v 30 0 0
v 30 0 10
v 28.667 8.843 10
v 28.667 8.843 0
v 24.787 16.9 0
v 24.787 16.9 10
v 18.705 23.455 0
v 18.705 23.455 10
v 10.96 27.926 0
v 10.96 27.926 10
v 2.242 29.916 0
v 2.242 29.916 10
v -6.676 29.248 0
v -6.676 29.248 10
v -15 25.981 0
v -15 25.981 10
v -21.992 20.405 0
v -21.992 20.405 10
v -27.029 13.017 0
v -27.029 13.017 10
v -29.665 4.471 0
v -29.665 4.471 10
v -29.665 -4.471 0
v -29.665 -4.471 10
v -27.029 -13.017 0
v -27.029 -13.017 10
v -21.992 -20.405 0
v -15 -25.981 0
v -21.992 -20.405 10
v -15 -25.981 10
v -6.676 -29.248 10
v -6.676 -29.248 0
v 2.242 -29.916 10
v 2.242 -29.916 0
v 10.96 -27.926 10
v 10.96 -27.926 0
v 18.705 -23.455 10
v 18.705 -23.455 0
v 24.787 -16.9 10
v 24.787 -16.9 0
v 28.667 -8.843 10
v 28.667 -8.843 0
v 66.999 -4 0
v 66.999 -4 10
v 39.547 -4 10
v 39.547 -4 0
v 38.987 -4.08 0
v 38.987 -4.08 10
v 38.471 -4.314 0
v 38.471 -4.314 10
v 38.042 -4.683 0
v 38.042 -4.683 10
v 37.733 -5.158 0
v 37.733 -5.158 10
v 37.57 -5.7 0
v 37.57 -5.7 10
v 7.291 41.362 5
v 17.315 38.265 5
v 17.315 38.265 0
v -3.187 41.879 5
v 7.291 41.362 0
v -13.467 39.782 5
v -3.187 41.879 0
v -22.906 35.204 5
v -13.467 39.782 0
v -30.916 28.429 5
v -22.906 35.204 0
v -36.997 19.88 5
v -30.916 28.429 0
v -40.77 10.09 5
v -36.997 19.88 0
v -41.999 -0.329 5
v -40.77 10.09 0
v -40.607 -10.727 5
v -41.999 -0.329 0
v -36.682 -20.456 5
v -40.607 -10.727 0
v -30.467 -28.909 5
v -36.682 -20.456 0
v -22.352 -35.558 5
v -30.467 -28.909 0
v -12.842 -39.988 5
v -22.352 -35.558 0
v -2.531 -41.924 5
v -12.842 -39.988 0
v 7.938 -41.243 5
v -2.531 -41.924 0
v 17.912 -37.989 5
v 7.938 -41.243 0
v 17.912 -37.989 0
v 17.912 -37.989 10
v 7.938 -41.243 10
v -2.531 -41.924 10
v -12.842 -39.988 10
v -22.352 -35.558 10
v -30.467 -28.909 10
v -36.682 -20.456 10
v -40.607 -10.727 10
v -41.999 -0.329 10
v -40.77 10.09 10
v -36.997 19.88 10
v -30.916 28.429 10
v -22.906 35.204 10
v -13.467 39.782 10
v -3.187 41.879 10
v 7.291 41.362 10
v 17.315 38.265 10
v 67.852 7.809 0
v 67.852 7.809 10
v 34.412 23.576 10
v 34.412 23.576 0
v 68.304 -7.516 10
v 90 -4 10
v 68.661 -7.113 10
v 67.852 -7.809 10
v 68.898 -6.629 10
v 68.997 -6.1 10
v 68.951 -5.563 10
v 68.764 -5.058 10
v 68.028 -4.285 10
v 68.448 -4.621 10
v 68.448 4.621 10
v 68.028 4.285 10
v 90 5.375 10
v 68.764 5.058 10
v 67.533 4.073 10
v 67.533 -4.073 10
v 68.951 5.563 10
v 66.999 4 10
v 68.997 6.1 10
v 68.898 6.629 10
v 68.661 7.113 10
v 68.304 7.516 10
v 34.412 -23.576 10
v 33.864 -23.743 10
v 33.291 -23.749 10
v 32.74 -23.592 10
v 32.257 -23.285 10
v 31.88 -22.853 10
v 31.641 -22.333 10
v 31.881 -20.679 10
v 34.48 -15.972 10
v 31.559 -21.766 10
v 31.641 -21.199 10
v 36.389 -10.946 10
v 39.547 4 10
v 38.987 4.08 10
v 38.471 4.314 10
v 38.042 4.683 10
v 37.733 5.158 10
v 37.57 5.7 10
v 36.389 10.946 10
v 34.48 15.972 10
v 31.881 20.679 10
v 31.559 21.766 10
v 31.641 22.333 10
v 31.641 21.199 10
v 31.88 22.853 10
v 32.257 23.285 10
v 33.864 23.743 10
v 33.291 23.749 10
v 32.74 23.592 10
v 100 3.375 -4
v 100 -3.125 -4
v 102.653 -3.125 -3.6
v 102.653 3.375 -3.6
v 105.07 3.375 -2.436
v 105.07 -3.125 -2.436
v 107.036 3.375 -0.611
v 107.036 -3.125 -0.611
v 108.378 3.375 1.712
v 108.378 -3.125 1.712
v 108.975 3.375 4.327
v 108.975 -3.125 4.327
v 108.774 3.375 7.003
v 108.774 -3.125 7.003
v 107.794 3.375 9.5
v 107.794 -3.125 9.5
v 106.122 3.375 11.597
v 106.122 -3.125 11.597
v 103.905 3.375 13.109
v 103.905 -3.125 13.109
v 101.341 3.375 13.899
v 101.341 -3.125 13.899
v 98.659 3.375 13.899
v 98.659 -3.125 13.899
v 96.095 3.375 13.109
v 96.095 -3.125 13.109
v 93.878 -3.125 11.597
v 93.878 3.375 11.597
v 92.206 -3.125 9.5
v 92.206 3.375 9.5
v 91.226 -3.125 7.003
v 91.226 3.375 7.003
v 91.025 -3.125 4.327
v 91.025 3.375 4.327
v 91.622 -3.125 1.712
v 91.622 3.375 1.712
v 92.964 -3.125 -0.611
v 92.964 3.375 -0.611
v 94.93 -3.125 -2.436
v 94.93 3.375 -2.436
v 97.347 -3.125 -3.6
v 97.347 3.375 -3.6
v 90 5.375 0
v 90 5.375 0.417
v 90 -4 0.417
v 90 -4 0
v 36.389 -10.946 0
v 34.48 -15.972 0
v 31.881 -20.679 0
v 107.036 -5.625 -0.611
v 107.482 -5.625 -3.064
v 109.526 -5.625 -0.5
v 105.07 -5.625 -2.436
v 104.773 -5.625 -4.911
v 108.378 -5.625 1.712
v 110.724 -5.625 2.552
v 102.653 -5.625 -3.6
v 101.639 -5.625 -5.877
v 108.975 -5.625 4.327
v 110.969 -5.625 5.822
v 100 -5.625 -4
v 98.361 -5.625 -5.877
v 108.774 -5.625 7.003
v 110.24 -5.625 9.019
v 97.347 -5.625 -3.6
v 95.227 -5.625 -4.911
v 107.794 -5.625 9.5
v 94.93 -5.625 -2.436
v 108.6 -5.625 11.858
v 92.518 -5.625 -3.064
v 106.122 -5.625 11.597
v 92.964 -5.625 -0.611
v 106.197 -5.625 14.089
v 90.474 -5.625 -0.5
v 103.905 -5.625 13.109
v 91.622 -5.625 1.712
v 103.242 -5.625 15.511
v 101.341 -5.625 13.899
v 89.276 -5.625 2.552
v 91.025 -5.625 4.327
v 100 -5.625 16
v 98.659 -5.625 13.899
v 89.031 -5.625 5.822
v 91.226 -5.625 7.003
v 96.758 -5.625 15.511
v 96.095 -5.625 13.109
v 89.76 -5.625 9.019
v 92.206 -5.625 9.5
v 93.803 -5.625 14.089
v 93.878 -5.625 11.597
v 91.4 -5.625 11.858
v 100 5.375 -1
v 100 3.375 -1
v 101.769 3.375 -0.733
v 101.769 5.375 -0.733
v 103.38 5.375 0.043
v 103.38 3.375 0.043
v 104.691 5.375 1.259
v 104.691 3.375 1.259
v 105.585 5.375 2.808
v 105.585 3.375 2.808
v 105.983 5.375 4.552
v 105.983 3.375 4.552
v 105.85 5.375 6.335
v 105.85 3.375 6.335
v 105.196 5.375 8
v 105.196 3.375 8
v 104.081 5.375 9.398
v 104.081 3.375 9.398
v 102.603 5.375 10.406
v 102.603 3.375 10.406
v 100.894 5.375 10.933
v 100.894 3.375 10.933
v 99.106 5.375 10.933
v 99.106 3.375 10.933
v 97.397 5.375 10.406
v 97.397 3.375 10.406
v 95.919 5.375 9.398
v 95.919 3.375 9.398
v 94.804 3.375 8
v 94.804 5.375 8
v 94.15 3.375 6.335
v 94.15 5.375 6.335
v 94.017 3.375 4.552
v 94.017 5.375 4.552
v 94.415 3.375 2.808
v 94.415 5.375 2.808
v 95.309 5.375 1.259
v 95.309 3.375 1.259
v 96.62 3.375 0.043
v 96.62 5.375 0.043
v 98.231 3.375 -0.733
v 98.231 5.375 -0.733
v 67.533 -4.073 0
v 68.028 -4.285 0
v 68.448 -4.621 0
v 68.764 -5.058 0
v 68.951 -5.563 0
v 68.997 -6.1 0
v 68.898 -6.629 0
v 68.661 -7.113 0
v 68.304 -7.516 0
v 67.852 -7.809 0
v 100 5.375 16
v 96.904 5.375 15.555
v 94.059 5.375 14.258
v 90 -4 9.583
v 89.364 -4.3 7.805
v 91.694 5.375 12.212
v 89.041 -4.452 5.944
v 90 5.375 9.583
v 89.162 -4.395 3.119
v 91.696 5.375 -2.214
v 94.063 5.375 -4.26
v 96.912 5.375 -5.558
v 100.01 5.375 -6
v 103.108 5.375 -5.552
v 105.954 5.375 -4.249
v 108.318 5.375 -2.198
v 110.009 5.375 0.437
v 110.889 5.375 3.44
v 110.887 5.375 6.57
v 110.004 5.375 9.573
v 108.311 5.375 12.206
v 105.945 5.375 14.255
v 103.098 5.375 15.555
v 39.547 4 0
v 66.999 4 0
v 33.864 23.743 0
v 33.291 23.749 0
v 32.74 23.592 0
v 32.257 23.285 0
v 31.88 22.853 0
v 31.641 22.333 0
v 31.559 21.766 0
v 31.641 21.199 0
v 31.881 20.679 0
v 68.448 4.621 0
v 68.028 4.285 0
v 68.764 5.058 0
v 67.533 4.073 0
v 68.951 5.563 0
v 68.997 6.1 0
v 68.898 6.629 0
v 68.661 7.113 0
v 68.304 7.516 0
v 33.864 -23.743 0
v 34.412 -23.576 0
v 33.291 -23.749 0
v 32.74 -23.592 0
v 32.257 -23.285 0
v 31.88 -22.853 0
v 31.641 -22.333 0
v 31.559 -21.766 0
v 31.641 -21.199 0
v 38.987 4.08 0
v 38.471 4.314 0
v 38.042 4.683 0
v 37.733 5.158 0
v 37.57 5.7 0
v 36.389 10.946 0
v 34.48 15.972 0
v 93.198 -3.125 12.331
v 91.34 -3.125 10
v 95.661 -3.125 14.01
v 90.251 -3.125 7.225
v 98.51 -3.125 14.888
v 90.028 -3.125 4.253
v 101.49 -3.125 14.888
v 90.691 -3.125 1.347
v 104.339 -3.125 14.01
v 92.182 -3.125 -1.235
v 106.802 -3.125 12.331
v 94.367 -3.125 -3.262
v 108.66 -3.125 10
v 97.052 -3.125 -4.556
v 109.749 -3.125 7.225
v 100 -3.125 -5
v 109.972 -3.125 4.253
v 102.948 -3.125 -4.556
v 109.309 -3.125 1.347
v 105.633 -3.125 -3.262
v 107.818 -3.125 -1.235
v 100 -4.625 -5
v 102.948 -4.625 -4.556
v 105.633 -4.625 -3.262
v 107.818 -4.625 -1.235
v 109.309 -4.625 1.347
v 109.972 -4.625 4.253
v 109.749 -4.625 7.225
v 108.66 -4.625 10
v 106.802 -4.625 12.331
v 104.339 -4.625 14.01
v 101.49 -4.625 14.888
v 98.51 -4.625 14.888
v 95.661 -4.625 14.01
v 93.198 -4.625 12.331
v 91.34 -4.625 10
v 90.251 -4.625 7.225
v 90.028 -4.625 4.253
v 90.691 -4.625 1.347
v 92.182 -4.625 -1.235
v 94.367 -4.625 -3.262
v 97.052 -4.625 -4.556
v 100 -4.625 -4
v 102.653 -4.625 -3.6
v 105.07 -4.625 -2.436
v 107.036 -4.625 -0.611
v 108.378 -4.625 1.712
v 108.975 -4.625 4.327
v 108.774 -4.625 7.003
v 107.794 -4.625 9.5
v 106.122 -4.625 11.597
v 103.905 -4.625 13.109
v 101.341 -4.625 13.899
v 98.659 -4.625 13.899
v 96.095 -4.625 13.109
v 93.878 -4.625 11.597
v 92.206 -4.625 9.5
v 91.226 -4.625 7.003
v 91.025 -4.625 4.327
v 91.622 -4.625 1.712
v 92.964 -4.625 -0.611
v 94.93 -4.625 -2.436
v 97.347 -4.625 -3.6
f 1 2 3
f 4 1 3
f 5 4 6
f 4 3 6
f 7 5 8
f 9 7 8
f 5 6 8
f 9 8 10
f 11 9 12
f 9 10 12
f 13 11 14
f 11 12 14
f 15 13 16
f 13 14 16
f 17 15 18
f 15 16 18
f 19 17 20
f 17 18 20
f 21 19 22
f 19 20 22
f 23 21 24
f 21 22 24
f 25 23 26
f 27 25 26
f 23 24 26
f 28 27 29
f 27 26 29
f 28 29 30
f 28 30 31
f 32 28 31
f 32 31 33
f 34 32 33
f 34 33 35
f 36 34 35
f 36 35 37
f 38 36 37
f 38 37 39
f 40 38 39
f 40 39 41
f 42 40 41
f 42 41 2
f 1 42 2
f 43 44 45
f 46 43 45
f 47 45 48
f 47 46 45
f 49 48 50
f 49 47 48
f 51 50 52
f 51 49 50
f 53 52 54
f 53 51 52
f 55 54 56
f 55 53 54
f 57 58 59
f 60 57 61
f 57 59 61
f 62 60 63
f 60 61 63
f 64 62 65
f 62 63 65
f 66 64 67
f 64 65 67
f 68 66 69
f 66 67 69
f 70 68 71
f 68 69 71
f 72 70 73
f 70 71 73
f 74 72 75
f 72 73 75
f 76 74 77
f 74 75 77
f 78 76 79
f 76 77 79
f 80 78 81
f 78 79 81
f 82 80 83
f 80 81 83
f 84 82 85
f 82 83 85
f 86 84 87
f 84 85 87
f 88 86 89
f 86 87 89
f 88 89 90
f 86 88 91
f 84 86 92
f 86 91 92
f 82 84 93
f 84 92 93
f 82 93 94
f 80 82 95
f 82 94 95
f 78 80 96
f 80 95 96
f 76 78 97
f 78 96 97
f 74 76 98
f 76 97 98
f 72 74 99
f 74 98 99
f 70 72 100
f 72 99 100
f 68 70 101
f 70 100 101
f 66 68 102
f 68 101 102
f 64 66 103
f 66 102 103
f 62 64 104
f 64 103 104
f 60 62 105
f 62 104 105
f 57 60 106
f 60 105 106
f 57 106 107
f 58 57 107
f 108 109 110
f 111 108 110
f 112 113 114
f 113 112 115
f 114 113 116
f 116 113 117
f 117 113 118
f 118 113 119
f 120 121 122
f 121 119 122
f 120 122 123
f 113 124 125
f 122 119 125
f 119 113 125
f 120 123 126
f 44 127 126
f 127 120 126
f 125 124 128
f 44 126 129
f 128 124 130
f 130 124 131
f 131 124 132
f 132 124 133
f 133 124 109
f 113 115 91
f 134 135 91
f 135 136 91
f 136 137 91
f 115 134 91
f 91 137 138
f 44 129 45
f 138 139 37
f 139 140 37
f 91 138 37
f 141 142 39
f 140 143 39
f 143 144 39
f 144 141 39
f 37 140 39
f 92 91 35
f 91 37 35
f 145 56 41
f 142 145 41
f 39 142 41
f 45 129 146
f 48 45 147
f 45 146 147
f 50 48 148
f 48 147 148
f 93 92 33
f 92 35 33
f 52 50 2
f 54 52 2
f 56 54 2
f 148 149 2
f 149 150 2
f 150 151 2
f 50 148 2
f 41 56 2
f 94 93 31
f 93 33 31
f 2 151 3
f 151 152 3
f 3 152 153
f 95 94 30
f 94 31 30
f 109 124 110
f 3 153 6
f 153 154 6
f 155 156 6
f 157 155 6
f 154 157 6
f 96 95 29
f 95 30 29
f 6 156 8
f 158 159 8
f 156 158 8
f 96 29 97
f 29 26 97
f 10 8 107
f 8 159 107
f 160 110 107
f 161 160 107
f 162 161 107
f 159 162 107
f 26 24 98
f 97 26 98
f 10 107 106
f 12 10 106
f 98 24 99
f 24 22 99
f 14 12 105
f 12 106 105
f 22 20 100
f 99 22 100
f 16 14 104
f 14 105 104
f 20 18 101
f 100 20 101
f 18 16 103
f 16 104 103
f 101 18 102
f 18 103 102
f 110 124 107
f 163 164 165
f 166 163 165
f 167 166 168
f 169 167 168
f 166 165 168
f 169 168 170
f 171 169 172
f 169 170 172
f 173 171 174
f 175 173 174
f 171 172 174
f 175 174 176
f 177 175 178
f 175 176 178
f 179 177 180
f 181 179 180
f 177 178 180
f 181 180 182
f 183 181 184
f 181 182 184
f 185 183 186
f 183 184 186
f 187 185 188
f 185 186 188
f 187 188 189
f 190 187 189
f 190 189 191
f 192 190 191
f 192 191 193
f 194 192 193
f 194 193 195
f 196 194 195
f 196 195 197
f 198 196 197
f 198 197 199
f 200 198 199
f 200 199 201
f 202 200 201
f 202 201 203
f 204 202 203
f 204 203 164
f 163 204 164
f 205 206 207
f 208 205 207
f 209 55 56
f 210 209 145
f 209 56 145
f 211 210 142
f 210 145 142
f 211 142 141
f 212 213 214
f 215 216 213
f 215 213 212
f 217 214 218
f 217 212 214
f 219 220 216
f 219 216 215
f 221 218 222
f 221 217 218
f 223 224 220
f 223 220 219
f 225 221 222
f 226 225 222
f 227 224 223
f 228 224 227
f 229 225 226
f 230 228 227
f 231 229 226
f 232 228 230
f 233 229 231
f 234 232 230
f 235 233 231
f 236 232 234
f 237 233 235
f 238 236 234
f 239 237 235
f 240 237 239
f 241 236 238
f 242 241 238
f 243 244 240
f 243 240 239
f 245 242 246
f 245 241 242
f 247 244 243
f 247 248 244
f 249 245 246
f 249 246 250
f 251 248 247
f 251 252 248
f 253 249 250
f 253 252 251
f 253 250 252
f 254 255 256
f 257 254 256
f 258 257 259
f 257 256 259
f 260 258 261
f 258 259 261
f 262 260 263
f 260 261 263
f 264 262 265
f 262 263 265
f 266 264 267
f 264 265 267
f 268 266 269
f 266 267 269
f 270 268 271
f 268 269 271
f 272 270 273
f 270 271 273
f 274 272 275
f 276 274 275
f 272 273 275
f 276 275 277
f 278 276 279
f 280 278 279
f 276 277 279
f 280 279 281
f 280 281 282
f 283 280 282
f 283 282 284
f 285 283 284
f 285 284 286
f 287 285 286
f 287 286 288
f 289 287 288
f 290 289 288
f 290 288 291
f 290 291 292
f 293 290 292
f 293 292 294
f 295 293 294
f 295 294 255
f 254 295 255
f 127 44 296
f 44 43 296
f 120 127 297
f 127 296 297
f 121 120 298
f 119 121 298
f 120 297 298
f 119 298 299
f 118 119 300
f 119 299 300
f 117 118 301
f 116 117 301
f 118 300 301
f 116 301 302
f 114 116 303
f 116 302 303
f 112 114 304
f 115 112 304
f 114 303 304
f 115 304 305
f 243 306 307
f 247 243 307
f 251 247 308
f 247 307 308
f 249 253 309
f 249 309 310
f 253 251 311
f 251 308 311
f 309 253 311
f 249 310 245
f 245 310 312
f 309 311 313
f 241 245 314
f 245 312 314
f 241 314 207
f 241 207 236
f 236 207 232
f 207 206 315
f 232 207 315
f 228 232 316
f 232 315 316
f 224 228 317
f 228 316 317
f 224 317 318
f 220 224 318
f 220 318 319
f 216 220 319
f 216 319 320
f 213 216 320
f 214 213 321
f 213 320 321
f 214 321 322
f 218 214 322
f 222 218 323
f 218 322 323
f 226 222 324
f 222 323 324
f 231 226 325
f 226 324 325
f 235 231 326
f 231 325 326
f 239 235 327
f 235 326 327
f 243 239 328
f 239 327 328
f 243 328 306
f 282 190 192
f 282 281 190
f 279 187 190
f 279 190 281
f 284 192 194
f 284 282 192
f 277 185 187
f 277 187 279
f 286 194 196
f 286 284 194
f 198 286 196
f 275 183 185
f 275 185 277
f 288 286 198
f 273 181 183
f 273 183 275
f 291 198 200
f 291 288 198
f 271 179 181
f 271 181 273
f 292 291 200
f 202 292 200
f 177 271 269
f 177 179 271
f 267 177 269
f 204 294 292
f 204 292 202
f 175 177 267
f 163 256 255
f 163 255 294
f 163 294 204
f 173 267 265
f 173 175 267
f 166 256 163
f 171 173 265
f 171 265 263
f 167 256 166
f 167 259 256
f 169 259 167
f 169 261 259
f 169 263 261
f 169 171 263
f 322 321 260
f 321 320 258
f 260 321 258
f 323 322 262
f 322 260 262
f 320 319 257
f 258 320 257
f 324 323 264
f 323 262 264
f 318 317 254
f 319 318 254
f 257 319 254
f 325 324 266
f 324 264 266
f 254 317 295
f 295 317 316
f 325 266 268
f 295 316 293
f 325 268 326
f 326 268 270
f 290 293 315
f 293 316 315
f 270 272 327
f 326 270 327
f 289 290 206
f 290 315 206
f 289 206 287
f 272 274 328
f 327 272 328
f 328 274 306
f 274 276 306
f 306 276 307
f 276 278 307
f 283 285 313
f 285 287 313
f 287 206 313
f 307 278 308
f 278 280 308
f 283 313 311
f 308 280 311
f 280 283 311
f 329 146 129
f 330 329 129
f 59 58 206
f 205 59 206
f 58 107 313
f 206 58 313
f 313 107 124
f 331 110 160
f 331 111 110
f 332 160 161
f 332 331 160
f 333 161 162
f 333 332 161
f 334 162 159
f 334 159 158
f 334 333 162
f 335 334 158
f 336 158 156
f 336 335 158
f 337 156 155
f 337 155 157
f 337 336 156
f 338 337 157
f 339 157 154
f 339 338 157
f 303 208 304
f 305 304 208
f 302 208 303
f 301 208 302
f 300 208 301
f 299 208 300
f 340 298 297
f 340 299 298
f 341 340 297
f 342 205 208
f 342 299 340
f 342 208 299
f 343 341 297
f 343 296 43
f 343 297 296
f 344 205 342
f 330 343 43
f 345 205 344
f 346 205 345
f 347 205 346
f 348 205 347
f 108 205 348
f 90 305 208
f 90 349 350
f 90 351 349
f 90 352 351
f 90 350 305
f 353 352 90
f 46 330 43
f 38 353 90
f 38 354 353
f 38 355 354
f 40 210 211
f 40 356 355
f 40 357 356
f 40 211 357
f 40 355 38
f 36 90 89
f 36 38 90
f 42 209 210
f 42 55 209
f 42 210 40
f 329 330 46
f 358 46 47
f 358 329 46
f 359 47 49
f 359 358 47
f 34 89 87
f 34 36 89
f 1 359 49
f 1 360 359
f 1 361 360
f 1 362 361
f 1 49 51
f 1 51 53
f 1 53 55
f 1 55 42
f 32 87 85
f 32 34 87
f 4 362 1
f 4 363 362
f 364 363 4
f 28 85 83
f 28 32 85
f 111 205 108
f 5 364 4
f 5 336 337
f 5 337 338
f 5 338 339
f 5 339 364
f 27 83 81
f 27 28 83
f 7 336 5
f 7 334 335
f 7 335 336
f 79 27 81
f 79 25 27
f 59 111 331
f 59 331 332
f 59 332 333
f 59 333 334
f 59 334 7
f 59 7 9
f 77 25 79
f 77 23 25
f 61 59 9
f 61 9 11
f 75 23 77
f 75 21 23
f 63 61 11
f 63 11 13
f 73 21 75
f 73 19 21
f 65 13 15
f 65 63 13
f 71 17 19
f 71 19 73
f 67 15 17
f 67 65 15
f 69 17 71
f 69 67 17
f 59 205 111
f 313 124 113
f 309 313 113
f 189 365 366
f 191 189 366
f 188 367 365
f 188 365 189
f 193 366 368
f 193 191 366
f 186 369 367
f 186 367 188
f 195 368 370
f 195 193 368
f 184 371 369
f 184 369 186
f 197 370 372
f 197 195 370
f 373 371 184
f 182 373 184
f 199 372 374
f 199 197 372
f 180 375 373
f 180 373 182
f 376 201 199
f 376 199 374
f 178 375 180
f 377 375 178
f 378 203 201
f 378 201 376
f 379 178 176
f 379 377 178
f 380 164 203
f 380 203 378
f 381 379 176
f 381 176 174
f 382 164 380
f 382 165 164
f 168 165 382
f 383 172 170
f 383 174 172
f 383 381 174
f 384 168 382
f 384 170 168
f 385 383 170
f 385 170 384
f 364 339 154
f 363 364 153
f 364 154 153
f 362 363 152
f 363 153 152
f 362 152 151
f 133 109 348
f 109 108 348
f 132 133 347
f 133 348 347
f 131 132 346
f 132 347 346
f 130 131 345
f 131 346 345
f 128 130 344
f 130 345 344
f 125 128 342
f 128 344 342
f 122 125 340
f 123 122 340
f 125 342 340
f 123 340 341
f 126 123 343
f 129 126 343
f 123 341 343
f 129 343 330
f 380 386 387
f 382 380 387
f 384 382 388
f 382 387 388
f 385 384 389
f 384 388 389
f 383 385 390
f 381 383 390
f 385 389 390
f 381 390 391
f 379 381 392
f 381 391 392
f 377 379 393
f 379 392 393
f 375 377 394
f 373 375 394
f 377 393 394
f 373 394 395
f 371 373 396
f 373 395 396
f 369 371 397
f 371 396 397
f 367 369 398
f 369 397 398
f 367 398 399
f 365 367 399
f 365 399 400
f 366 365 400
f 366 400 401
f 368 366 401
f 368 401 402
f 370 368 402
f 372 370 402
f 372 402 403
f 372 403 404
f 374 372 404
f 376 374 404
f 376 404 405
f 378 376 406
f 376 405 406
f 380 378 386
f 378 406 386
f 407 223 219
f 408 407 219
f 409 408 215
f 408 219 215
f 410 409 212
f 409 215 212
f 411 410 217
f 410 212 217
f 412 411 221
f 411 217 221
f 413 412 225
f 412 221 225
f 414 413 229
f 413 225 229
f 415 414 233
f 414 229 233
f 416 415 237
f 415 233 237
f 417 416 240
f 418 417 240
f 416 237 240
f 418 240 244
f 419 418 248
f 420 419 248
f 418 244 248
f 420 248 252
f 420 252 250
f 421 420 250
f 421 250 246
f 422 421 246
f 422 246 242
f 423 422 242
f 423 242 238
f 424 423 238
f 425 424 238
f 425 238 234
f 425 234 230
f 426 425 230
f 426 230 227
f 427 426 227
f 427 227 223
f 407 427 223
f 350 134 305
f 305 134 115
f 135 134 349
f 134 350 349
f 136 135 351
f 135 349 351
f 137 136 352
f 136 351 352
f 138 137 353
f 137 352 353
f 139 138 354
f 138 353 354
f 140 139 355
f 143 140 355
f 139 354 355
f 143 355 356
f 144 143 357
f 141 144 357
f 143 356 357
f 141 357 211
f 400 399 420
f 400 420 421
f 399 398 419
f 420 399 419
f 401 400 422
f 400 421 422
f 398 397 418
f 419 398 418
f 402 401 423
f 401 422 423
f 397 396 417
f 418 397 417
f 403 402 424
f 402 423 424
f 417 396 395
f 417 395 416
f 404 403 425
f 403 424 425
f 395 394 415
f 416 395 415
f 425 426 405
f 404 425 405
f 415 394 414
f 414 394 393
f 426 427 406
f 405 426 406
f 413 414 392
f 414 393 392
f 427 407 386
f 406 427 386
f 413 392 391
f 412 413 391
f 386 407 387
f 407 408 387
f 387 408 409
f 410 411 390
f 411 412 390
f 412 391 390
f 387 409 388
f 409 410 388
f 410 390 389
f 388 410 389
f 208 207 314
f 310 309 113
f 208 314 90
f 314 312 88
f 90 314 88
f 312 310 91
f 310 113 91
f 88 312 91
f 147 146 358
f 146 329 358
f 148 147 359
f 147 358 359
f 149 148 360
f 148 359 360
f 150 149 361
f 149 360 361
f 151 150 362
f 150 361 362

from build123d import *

# Parameters (mm, degrees)
SKETCH_1_R          = 42
EXTRUDE_1_DEPTH     = 5
SKETCH_2_W          = 11
SKETCH_2_H          = 11
EXTRUDE_2_DEPTH     = 5
SKETCH_4_R          = 6
CUT_EXTRUDE_1_DEPTH = 25
SKETCH_5_R          = 9
CUT_EXTRUDE_2_DEPTH = 9
CUT_EXTRUDE_START   = 8
SKETCH_6_R          = 10
SKETCH_6_R_2        = 9
CUT_EXTRUDE_3_DEPTH = 1.5
SKETCH_7_R          = 30
CUT_EXTRUDE_4_DEPTH = 30
FILLET_1_R          = 2


with BuildPart() as part:
    # 草图1 → 凸台-拉伸1 (new body)
    with BuildSketch(Plane.XY):
        Circle(SKETCH_1_R)
    extrude(amount=EXTRUDE_1_DEPTH)



with BuildPart() as body_2:
    # 草图2 → 旋转1 (revolve)
    with BuildSketch(Plane.XY.offset(5), mode=Mode.PRIVATE) as revolve_1_sk:
        with Locations((94.5, -0.125)):
            Rectangle(SKETCH_2_W, SKETCH_2_H)
    revolve(revolve_1_sk.sketch.rotate(Axis((100, 22.717290725, 5), (0, -1, 0)), 270), axis=Axis((100, 22.717290725, 5), (0, -1, 0)))


with BuildPart() as part_1:
    add(part.part)

    add(body_2.part)  # 凸台-拉伸2 merges body 2
    # 草图3 → 凸台-拉伸2 (add, symmetric)
    with BuildSketch(Plane.XY.offset(5)):
        with BuildLine():
            Line((17.314737244, 38.264864748), (90, 5.375))
            Line((90, 5.375), (90, -4))
            Line((90, -4), (17.911593748, -37.989140678))
            ThreePointArc((17.911593748, -37.989140678), (-41.998713488, -0.328732965), (17.314737244, 38.264864748))
        make_face()
    extrude(amount=EXTRUDE_2_DEPTH, both=True)

    # 草图4 → 切除-拉伸1 (cut)
    with BuildSketch(Plane.XZ.offset(5.625)):
        with Locations(Location((100, 5, 0), (0, 0, 270))):
            Circle(SKETCH_4_R)
    extrude(amount=-CUT_EXTRUDE_1_DEPTH, mode=Mode.SUBTRACT)

    # 草图5 → 切除-拉伸2 (cut)
    with BuildSketch(Plane.XZ.offset(5.625)):
        with Locations(Location((100, 5, 0), (0, 0, 270))):
            Circle(SKETCH_5_R)
    extrude(amount=-CUT_EXTRUDE_2_DEPTH, mode=Mode.SUBTRACT)

    # 草图6 → 切除-拉伸3 (cut)
    # profile 1 of 2: a face of its own
    with BuildSketch(Plane.XZ.offset(-3.375).offset(CUT_EXTRUDE_START)):
        with Locations(Location((100, 5, 0), (0, 0, 270))):
            Circle(SKETCH_6_R)
        with Locations(Location((100, 5, 0), (0, 0, 270))):
            Circle(SKETCH_6_R_2, mode=Mode.SUBTRACT)
    # profile 2 of 2: a face of its own
    with BuildSketch(Plane.XZ.offset(-3.375).offset(CUT_EXTRUDE_START)):
        with Locations(Location((100, 5, 0), (0, 0, 270))):
            Circle(SKETCH_6_R_2)
    extrude(amount=-CUT_EXTRUDE_3_DEPTH, mode=Mode.SUBTRACT)

    # 草图7 → 切除-拉伸4 (cut)
    with BuildSketch(Plane.XY.offset(10)):
        Circle(SKETCH_7_R)
        with BuildLine():
            Line((26.356552806, -27.373931471), (75.930900201, -4))
            Line((75.930900201, -4), (37.788887255, -4))
            ThreePointArc((37.788887255, -4), (34.135678377, -16.695971422), (26.356552806, -27.373931471))
        make_face()
        with BuildLine():
            Line((37.788887255, 4), (75.930900201, 4))
            Line((75.930900201, 4), (26.356552806, 27.373931471))
            ThreePointArc((26.356552806, 27.373931471), (34.135678377, 16.695971422), (37.788887255, 4))
        make_face()
    extrude(amount=-CUT_EXTRUDE_4_DEPTH, mode=Mode.SUBTRACT)

    # 圆角1
    fillet_1_edges = [part_1.edges().sort_by_distance(p)[0] for p in [
        (37.788887255, 4, 5),
        (26.356552806, 27.373931471, 5),
        (75.930900201, 4, 5),
        (26.356552806, -27.373931471, 5),
        (37.788887255, -4, 5),
        (75.930900201, -4, 5),
    ]]
    fillet(fillet_1_edges, radius=FILLET_1_R)


solid = part_1.part
